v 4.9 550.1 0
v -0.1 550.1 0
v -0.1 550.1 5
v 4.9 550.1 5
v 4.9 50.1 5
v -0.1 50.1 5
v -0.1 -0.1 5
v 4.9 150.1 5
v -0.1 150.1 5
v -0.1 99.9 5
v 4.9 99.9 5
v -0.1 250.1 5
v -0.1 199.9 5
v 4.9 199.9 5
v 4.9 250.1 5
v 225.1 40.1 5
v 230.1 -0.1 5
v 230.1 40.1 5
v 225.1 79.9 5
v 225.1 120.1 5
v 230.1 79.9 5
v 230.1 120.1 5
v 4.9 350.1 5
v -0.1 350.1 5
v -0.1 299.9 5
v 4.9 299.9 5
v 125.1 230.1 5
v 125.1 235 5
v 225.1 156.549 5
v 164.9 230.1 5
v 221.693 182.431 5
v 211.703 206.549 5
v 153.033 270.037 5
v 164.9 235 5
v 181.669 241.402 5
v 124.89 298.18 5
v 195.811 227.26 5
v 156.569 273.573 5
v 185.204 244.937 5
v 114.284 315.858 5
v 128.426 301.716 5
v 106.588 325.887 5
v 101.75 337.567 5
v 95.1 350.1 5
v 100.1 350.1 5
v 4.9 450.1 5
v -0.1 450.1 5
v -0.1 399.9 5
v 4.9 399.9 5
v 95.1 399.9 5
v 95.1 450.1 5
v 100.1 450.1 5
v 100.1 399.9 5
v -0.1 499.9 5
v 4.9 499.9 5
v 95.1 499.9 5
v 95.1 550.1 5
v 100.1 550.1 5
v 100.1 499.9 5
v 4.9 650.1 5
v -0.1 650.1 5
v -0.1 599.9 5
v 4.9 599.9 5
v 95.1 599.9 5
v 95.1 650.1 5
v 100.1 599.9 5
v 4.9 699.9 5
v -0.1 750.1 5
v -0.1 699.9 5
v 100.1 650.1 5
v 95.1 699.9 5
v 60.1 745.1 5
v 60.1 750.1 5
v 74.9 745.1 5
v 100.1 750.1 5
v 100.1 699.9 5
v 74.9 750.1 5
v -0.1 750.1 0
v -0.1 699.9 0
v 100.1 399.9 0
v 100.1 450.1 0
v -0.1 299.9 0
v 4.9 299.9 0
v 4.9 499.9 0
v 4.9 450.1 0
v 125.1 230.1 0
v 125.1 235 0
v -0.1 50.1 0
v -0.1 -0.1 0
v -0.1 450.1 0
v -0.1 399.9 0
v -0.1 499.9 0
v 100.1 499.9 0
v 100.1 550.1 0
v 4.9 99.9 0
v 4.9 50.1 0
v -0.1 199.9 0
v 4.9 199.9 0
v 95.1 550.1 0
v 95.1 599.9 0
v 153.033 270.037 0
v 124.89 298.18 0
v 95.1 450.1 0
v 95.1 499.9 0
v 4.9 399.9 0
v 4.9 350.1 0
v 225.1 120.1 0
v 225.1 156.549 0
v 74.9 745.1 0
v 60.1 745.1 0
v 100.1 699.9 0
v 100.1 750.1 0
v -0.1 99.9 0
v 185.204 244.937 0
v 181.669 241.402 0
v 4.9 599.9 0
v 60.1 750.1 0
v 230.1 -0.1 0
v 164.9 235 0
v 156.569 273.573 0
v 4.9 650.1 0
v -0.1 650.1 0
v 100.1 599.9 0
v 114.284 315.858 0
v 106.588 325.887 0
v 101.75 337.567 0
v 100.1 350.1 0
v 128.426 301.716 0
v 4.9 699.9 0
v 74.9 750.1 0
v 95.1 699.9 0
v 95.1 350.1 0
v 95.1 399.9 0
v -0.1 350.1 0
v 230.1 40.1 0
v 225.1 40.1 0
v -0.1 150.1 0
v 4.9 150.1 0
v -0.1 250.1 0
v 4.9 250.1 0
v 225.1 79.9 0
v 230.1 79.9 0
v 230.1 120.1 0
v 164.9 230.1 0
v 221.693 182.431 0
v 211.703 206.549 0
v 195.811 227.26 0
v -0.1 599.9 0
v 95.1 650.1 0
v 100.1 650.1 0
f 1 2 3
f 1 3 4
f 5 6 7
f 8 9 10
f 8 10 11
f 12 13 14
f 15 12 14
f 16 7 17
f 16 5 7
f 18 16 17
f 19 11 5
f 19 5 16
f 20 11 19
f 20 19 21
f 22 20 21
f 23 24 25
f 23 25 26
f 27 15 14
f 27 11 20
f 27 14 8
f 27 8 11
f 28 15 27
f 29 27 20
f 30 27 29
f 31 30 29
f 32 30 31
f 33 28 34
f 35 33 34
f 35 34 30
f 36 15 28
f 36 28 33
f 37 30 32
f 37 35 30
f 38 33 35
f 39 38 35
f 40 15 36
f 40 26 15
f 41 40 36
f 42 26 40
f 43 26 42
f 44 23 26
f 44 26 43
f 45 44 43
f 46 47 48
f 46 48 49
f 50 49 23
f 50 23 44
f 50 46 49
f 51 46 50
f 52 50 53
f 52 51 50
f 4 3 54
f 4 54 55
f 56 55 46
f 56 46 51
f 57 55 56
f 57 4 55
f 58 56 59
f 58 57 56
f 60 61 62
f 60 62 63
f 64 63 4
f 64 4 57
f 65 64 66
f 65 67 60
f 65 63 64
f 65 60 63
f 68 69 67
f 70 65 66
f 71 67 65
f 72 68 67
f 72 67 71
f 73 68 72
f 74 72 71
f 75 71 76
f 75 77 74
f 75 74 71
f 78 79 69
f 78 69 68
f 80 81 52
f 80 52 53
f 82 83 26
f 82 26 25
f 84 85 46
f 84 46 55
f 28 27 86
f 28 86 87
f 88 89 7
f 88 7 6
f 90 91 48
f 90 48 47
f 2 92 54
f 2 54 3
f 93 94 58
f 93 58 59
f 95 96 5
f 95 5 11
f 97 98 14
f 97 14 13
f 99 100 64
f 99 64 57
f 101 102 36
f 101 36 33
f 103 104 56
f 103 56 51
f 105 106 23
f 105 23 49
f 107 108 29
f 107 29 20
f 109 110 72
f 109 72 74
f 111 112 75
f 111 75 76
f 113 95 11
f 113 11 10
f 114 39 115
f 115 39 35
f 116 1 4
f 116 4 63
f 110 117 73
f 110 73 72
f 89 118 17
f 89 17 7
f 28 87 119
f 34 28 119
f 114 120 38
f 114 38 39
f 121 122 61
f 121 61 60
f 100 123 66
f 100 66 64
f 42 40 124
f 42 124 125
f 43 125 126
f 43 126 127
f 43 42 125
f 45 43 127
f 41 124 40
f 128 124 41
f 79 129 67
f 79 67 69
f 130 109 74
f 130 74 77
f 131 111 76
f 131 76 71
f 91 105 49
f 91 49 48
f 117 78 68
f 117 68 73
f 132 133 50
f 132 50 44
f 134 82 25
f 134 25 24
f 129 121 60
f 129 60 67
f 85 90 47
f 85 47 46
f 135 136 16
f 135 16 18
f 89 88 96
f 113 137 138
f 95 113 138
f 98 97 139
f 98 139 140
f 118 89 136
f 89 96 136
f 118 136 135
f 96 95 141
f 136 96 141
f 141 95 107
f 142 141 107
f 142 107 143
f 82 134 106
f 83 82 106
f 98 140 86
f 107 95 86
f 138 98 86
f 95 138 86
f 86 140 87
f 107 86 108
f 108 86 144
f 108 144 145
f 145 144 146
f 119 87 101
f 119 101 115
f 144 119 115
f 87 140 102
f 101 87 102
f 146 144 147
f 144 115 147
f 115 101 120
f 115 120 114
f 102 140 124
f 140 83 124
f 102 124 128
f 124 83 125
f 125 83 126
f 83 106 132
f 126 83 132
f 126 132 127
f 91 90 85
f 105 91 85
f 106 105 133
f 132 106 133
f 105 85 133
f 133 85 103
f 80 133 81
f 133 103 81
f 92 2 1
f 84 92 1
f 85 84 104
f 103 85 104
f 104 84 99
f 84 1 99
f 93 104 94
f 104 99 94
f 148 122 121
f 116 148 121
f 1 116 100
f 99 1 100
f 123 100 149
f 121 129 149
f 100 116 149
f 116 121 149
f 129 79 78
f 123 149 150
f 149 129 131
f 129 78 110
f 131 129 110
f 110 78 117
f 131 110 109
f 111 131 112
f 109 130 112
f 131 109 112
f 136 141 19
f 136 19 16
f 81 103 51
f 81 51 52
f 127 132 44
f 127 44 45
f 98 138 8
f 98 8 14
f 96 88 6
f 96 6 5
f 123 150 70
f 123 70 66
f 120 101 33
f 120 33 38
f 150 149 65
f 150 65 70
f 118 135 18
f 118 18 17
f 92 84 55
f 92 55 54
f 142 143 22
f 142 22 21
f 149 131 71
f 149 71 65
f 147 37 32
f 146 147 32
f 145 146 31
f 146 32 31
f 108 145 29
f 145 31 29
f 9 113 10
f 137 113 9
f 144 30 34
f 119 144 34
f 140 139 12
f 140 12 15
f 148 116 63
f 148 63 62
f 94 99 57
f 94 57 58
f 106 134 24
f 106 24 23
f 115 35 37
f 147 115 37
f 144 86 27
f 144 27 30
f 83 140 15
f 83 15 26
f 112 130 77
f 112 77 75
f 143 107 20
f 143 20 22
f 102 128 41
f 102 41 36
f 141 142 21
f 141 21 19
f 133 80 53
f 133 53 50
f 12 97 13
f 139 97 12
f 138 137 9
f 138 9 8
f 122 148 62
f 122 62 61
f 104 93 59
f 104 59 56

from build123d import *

# Parameters (mm, degrees)
ESQUISSE1_W             = 39.8
ESQUISSE1_H             = 4.9
BOSS_EXTRU_1_DEPTH      = 5
ENL_V_MAT_EXTRU_1_REACH = 7
BOSS_EXTRU_2_DEPTH      = 5


with BuildPart() as part:
    # Esquisse1 → Boss.-Extru.1 (new body)
    with BuildSketch(Plane.XY):
        Polygon((100.1, 330.041421356), (128.425692604, 301.715728753), (124.890158698, 298.180194847), (153.033008589, 270.037344955), (156.568542495, 273.572878861), (200.043297184, 230.098124172), (196.507763279, 226.562590266), (211.415404008, 211.654949536), (214.950937914, 215.190483442), (230.1, 200.041421356), (230.1, 159.9), (225.1, 159.9), (225.1, 120.1), (230.1, 120.1), (230.1, 79.9), (225.1, 79.9), (225.1, 40.1), (230.1, 40.1), (230.1, -0.1), (-0.1, -0.1), (-0.1, 50.1), (4.9, 50.1), (4.9, 99.9), (-0.1, 99.9), (-0.1, 150.1), (4.9, 150.1), (4.9, 199.9), (-0.1, 199.9), (-0.1, 250.1), (4.9, 250.1), (4.9, 299.9), (-0.1, 299.9), (-0.1, 350.1), (4.9, 350.1), (4.9, 399.9), (-0.1, 399.9), (-0.1, 450.1), (4.9, 450.1), (4.9, 499.9), (-0.1, 499.9), (-0.1, 550.1), (4.9, 550.1), (4.9, 599.9), (-0.1, 599.9), (-0.1, 650.1), (4.9, 650.1), (4.9, 699.9), (-0.1, 699.9), (-0.1, 750.1), (60.1, 750.1), (60.1, 745.1), (74.9, 745.1), (74.9, 750.1), (100.1, 750.1), (100.1, 699.9), (95.1, 699.9), (95.1, 650.1), (100.1, 650.1), (100.1, 599.9), (95.1, 599.9), (95.1, 550.1), (100.1, 550.1), (100.1, 499.9), (95.1, 499.9), (95.1, 450.1), (100.1, 450.1), (100.1, 399.9), (95.1, 399.9), (95.1, 350.1), (100.1, 350.1), align=None)
        with Locations((145, 232.55)):
            Rectangle(ESQUISSE1_W, ESQUISSE1_H, mode=Mode.SUBTRACT)
    extrude(amount=BOSS_EXTRU_1_DEPTH)

    # Esquisse3 → Enlèv. mat.-Extru.1 (cut, up to next)
    with BuildSketch(Plane.XY.offset(5), mode=Mode.PRIVATE) as enl_v_mat_extru_1_sk1:
        with BuildLine():
            Line((225.1, 156.548997307), (230.1, 156.548997307))
            Line((230.1, 156.548997307), (230.1, 200.041421356))
            Line((230.1, 200.041421356), (185.204076401, 244.937344955))
            Line((185.204076401, 244.937344955), (181.668542495, 241.401811049))
            Line((181.668542495, 241.401811049), (195.810678119, 227.259675426))
            ThreePointArc((195.810678119, 227.259675426), (217.487953251, 194.817340544), (225.1, 156.548997307))
        make_face()
    enl_v_mat_extru_1_tool1 = extrude(enl_v_mat_extru_1_sk1.sketch, amount=-ENL_V_MAT_EXTRU_1_REACH, mode=Mode.PRIVATE) & part.part
    add(enl_v_mat_extru_1_tool1.solids().sort_by_distance((215.811514, 201.214449, 5))[0], mode=Mode.SUBTRACT)

    # Esquisse4 → Boss.-Extru.2 (add)
    with BuildSketch(Plane.XY.offset(5)):
        with BuildLine():
            Line((100.1, 350.1), (100.1, 330.041421356))
            Line((100.1, 330.041421356), (114.28355698, 315.857864376))
            ThreePointArc((114.28355698, 315.857864376), (103.786186359, 331.56828974), (100.1, 350.1))
        make_face()
    extrude(amount=-BOSS_EXTRU_2_DEPTH)


solid = part.part
